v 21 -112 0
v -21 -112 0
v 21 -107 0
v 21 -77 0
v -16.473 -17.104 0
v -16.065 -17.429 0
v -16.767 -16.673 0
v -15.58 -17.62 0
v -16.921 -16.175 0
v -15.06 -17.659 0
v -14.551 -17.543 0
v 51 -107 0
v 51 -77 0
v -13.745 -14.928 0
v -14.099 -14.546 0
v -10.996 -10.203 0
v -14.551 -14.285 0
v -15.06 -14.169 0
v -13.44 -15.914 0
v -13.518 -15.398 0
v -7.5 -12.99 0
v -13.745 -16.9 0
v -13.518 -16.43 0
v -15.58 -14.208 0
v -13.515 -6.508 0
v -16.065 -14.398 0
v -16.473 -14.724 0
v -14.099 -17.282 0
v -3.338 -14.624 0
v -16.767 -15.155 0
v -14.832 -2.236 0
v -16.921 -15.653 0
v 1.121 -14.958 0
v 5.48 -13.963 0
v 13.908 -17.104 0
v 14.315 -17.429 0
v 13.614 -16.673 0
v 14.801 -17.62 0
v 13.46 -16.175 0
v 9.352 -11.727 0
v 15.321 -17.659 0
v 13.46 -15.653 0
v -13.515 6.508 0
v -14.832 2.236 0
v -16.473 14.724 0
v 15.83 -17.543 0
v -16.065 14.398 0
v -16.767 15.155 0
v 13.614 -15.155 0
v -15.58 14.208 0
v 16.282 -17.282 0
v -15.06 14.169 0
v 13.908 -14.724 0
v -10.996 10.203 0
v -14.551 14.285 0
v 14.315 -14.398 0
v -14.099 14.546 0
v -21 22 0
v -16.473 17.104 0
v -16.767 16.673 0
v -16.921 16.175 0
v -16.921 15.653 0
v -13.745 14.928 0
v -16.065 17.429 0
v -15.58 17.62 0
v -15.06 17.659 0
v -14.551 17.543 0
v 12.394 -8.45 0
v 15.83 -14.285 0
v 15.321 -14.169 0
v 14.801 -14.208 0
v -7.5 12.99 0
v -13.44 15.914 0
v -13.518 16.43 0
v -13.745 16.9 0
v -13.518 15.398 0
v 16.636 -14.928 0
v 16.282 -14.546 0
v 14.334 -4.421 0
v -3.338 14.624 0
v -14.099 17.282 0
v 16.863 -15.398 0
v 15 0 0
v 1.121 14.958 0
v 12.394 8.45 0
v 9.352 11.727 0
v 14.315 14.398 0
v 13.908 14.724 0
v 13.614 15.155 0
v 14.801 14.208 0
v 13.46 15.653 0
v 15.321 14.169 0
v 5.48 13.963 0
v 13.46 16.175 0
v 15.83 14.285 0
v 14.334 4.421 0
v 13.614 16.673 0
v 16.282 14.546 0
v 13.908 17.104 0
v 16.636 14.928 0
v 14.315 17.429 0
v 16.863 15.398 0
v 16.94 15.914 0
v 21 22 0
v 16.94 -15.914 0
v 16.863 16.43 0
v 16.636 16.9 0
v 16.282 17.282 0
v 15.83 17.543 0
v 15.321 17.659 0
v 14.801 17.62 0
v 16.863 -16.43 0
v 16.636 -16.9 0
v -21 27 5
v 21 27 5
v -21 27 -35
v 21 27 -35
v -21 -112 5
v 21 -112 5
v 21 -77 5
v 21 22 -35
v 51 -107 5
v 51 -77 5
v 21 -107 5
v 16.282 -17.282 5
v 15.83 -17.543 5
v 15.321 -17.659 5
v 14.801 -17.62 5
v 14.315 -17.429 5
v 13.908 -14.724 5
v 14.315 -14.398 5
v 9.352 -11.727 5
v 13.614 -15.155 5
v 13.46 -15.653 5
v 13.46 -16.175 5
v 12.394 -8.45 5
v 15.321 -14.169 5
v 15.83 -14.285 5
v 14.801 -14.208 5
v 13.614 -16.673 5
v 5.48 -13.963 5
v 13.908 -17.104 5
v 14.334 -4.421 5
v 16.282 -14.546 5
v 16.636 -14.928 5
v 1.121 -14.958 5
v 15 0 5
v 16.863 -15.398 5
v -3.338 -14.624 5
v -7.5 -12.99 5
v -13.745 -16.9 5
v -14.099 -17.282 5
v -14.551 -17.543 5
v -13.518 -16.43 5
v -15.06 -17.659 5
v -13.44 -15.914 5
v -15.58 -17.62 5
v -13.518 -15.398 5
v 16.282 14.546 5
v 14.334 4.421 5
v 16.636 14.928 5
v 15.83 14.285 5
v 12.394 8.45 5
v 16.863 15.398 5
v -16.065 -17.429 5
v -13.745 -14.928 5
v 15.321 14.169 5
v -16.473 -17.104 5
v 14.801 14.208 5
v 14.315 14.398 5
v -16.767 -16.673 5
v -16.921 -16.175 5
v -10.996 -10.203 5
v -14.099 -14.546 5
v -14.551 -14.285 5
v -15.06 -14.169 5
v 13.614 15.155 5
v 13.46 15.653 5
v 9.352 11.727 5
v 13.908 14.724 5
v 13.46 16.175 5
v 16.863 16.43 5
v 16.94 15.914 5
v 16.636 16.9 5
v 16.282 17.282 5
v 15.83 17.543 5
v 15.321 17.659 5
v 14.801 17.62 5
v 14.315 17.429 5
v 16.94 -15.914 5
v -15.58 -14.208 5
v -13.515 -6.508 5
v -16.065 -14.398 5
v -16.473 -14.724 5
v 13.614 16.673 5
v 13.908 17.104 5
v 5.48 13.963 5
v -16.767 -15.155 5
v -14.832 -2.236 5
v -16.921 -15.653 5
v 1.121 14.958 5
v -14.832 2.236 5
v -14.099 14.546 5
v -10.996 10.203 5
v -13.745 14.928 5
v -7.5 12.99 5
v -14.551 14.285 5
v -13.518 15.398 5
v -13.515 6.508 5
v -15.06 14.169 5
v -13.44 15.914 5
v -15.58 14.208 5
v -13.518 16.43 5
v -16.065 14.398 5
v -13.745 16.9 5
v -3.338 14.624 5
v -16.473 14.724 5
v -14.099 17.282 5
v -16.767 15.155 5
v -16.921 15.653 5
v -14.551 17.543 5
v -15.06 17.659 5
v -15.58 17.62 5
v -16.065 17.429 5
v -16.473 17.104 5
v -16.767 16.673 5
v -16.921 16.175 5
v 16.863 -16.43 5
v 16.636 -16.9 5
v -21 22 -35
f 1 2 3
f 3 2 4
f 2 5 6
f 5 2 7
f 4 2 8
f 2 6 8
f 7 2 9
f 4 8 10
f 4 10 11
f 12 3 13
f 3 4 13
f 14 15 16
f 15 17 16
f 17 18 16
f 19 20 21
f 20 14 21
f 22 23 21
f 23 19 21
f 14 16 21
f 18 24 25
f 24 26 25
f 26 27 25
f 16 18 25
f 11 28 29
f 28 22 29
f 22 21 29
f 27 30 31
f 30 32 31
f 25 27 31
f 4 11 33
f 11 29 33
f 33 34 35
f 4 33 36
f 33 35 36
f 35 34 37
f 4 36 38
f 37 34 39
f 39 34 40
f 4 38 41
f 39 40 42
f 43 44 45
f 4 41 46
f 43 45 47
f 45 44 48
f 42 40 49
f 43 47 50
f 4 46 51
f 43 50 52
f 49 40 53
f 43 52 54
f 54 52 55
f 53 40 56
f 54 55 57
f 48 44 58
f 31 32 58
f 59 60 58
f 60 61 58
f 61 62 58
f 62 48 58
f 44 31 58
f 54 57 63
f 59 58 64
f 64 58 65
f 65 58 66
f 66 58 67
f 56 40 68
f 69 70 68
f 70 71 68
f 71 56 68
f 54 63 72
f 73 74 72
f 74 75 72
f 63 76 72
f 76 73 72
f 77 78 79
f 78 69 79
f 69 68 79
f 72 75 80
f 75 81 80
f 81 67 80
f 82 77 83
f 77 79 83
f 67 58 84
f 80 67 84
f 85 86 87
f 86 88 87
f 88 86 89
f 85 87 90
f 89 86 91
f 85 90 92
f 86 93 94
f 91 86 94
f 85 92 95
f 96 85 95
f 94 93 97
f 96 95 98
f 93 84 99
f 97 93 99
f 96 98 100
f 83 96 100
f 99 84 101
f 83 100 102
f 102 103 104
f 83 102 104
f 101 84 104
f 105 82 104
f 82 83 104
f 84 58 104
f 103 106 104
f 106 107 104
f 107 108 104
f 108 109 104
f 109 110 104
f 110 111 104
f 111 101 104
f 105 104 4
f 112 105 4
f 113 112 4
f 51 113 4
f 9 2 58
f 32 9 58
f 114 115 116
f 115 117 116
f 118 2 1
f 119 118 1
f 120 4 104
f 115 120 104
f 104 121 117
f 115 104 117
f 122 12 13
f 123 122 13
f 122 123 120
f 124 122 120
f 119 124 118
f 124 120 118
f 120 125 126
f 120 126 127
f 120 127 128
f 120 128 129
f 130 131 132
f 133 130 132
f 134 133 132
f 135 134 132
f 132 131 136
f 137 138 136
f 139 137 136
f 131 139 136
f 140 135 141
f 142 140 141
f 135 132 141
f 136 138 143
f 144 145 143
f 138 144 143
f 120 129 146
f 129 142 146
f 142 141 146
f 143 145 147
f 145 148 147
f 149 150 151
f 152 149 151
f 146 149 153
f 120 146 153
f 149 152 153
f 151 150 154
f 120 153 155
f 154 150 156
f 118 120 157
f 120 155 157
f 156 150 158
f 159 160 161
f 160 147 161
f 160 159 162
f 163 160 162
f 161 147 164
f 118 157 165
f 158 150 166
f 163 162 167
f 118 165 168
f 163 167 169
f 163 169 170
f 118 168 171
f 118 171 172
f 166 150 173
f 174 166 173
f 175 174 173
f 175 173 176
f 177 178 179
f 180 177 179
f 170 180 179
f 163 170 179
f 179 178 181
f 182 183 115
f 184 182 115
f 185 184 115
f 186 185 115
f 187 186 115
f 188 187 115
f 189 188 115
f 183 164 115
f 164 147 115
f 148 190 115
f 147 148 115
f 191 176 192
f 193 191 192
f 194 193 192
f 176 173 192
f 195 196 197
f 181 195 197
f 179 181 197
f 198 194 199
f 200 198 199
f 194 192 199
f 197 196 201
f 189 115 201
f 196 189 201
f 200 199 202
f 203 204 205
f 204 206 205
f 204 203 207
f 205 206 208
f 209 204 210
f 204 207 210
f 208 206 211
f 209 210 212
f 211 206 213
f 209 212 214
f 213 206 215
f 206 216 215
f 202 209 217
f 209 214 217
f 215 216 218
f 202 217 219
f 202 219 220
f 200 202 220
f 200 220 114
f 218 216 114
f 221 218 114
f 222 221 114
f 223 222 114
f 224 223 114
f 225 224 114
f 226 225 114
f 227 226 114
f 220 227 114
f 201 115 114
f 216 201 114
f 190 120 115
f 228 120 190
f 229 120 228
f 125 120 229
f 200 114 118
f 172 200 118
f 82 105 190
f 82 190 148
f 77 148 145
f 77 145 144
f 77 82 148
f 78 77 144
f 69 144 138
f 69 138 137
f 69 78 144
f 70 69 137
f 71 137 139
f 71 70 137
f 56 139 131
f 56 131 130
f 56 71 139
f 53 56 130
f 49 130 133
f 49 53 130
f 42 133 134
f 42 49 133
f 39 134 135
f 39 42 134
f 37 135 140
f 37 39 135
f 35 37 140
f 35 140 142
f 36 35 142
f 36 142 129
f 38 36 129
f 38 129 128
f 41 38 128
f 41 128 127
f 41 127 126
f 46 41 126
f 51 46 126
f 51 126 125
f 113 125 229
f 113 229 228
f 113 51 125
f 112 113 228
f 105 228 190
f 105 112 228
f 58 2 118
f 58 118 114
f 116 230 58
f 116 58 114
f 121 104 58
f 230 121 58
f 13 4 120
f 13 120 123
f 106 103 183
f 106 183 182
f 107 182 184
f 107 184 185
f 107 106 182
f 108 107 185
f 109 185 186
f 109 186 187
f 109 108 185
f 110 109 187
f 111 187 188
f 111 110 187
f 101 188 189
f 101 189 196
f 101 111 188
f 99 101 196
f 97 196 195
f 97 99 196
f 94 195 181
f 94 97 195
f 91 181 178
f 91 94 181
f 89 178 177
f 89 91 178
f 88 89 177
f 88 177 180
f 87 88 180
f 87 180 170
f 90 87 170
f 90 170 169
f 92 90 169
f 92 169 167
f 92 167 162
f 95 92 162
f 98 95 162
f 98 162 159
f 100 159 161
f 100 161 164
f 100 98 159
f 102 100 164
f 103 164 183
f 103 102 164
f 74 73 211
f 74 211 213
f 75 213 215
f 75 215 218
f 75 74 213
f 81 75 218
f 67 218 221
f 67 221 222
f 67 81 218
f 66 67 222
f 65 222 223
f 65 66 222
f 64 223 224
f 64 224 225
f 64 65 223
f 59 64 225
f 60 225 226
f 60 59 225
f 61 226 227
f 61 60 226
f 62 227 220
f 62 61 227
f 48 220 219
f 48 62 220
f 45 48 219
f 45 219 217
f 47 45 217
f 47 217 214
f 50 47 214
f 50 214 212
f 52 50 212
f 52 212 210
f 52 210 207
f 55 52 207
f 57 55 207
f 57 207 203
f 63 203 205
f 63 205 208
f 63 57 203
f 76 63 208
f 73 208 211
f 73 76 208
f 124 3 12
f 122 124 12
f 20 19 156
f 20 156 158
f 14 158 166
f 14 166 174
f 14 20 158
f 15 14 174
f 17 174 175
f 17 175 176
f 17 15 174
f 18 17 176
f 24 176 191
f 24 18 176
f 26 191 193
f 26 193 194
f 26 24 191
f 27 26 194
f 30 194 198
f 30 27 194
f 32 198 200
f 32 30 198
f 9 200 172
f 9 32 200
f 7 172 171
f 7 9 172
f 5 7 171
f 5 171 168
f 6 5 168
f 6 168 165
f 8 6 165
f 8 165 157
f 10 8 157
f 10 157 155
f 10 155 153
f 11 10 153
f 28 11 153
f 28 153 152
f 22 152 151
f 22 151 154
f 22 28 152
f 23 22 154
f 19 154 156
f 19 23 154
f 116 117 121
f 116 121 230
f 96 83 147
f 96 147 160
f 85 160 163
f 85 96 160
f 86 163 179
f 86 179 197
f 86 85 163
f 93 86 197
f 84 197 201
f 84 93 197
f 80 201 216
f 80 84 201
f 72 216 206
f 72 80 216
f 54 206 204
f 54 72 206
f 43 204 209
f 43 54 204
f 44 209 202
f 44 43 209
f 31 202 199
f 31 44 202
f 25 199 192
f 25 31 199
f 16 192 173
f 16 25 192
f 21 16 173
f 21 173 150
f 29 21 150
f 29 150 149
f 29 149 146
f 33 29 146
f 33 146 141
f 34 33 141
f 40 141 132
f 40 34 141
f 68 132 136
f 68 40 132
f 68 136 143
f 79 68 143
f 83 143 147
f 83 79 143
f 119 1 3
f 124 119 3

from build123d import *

# Parameters (mm, degrees)
SKETCH1_W                = 30
SKETCH1_H                = 30
SKETCH1_R                = 1.75
SKETCH1_R_2              = 15
BOSS_EXTRUDE1_DEPTH      = 5
SKETCH2_W                = 42
SKETCH2_H                = 5
BOSS_EXTRUDE3_DEPTH      = 35
BOSS_EXTRUDE3_DEPTH_BACK = 5


with BuildPart() as part:
    # Sketch1 → Boss-Extrude1 (new body)
    with BuildSketch(Plane.XY):
        with Locations((36, -92)):
            Rectangle(SKETCH1_W, SKETCH1_H)
        Polygon((-21, -22), (-21, -112), (21, -112), (21, -22), (21, 22), (-21, 22), align=None)
        with Locations((-15.190466427, 15.913821971)):
            Circle(SKETCH1_R, mode=Mode.SUBTRACT)
        with Locations((-15.190466427, -15.913821971)):
            Circle(SKETCH1_R, mode=Mode.SUBTRACT)
        with Locations((15.190466427, -15.913821971)):
            Circle(SKETCH1_R, mode=Mode.SUBTRACT)
        with Locations((15.190466427, 15.913821971)):
            Circle(SKETCH1_R, mode=Mode.SUBTRACT)
        Circle(SKETCH1_R_2, mode=Mode.SUBTRACT)
    extrude(amount=BOSS_EXTRUDE1_DEPTH)

    # Sketch2 → Boss-Extrude3 (add, two sides)
    with BuildSketch(Plane(origin=(0, 0, 0), x_dir=(-1, 0, 0), z_dir=(0, 0, -1))) as boss_extrude3_sk:
        with Locations((0, 24.5)):
            Rectangle(SKETCH2_W, SKETCH2_H)
    extrude(amount=BOSS_EXTRUDE3_DEPTH)
    extrude(boss_extrude3_sk.sketch, amount=-BOSS_EXTRUDE3_DEPTH_BACK)


solid = part.part
